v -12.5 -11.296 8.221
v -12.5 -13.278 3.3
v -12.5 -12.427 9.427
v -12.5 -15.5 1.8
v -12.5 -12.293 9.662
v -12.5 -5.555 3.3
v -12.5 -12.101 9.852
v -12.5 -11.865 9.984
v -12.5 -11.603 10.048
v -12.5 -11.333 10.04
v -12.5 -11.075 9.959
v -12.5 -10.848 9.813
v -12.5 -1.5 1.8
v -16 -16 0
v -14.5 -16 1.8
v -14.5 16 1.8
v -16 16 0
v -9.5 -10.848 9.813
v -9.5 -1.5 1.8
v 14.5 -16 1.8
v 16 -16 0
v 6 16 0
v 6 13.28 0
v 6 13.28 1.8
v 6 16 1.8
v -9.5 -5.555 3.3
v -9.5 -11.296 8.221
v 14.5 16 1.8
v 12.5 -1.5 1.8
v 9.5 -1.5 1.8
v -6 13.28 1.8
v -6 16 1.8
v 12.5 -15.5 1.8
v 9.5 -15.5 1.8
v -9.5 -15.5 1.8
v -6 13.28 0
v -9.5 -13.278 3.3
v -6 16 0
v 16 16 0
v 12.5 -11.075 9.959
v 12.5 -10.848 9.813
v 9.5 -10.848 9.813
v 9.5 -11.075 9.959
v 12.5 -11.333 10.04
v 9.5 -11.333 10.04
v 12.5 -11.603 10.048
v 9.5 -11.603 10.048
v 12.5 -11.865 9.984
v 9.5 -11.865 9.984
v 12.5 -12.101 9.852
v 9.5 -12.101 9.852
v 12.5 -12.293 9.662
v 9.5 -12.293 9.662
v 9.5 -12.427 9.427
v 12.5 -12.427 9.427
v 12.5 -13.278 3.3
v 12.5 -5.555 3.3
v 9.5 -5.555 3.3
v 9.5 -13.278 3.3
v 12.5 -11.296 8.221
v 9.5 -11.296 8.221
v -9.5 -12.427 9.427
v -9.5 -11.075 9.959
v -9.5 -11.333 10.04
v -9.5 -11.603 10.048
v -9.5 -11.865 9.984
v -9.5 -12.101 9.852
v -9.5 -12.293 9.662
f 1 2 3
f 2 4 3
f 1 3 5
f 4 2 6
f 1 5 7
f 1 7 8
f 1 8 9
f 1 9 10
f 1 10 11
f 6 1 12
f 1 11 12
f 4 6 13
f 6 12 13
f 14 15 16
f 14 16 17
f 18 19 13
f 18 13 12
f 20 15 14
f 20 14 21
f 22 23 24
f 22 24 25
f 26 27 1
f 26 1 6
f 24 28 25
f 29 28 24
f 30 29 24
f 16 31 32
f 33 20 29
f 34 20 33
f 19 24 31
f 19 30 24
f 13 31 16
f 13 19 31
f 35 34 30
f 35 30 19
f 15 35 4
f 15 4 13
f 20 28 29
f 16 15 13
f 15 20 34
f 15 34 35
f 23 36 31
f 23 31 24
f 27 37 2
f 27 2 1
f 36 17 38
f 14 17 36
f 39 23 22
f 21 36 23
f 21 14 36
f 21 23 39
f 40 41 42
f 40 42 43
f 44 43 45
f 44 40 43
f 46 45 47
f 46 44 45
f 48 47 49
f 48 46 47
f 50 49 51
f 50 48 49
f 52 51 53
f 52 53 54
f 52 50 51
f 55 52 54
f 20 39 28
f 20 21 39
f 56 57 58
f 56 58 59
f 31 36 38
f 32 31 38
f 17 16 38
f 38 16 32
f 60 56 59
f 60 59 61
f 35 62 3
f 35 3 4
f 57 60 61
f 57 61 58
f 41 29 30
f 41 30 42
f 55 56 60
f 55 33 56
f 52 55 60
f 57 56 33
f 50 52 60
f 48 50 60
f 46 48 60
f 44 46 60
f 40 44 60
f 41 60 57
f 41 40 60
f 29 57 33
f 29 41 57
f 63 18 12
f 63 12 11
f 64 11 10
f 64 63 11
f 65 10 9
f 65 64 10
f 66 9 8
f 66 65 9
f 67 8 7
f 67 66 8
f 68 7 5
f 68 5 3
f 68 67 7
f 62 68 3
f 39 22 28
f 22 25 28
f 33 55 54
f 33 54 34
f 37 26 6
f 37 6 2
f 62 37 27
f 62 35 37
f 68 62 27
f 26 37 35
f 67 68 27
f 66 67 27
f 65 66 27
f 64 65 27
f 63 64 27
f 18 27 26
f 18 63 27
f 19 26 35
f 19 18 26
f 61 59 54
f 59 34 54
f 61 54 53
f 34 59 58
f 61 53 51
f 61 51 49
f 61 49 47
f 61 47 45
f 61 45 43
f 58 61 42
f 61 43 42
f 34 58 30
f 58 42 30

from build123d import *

# Parameters (mm, degrees)
F3_DEPTH = 16
F4_W     = 12
F4_H     = 2.84
F5_DEPTH = 25
F1_DEPTH = 12.5
F6_DEPTH = 9.5


with BuildPart() as f3:
    # F2 (on Front) → F3 (new body, symmetric)
    with BuildSketch(Plane.XZ):
        Polygon((0, 1.8), (0, 0), (16, 0), (14.5, 1.8), align=None)
        Polygon((-16, 0), (0, 0), (0, 1.8), (-14.5, 1.8), align=None)
    extrude(amount=F3_DEPTH, both=True)

    # F4 (on Top) → F5 (cut)
    with BuildSketch(Plane.XY):
        with Locations((0, 14.7)):
            Rectangle(F4_W, F4_H)
    extrude(amount=F5_DEPTH, mode=Mode.SUBTRACT)

    # F0 (on Right) → F1 (join, symmetric)
    with BuildSketch(Plane.YZ):
        with BuildLine():
            Line((-12.426555, 9.427268), (-15.5, 1.8))
            Line((-15.5, 1.8), (-1.5, 1.8))
            Line((-1.5, 1.8), (-10.848235, 9.812773))
            ThreePointArc((-10.848235, 9.812773), (-11.736301, 10.024959), (-12.426555, 9.427268))
        make_face()
        Polygon((-13.278367, 3.3), (-11.295587, 8.220601), (-5.554886, 3.3), align=None, mode=Mode.SUBTRACT)
    extrude(amount=F1_DEPTH, both=True)

    # F0 (on Right) → F6 (cut, symmetric)
    with BuildSketch(Plane.YZ):
        with BuildLine():
            Line((-12.426555, 9.427268), (-15.5, 1.8))
            Line((-15.5, 1.8), (-1.5, 1.8))
            Line((-1.5, 1.8), (-10.848235, 9.812773))
            ThreePointArc((-10.848235, 9.812773), (-11.736301, 10.024959), (-12.426555, 9.427268))
        make_face()
        Polygon((-13.278367, 3.3), (-11.295587, 8.220601), (-5.554886, 3.3), align=None, mode=Mode.SUBTRACT)
        with BuildLine():
            Line((-15.5, 11.625779), (-15.5, 1.8))
            Line((-15.5, 1.8), (-12.426555, 9.427268))
            ThreePointArc((-12.426555, 9.427268), (-11.736301, 10.024959), (-10.848235, 9.812773))
            Line((-10.848235, 9.812773), (-13.849209, 12.385036))
            ThreePointArc((-13.849209, 12.385036), (-14.917857, 12.534292), (-15.5, 11.625779))
        make_face()
    extrude(amount=F6_DEPTH, both=True, mode=Mode.SUBTRACT)


solid = f3.part
